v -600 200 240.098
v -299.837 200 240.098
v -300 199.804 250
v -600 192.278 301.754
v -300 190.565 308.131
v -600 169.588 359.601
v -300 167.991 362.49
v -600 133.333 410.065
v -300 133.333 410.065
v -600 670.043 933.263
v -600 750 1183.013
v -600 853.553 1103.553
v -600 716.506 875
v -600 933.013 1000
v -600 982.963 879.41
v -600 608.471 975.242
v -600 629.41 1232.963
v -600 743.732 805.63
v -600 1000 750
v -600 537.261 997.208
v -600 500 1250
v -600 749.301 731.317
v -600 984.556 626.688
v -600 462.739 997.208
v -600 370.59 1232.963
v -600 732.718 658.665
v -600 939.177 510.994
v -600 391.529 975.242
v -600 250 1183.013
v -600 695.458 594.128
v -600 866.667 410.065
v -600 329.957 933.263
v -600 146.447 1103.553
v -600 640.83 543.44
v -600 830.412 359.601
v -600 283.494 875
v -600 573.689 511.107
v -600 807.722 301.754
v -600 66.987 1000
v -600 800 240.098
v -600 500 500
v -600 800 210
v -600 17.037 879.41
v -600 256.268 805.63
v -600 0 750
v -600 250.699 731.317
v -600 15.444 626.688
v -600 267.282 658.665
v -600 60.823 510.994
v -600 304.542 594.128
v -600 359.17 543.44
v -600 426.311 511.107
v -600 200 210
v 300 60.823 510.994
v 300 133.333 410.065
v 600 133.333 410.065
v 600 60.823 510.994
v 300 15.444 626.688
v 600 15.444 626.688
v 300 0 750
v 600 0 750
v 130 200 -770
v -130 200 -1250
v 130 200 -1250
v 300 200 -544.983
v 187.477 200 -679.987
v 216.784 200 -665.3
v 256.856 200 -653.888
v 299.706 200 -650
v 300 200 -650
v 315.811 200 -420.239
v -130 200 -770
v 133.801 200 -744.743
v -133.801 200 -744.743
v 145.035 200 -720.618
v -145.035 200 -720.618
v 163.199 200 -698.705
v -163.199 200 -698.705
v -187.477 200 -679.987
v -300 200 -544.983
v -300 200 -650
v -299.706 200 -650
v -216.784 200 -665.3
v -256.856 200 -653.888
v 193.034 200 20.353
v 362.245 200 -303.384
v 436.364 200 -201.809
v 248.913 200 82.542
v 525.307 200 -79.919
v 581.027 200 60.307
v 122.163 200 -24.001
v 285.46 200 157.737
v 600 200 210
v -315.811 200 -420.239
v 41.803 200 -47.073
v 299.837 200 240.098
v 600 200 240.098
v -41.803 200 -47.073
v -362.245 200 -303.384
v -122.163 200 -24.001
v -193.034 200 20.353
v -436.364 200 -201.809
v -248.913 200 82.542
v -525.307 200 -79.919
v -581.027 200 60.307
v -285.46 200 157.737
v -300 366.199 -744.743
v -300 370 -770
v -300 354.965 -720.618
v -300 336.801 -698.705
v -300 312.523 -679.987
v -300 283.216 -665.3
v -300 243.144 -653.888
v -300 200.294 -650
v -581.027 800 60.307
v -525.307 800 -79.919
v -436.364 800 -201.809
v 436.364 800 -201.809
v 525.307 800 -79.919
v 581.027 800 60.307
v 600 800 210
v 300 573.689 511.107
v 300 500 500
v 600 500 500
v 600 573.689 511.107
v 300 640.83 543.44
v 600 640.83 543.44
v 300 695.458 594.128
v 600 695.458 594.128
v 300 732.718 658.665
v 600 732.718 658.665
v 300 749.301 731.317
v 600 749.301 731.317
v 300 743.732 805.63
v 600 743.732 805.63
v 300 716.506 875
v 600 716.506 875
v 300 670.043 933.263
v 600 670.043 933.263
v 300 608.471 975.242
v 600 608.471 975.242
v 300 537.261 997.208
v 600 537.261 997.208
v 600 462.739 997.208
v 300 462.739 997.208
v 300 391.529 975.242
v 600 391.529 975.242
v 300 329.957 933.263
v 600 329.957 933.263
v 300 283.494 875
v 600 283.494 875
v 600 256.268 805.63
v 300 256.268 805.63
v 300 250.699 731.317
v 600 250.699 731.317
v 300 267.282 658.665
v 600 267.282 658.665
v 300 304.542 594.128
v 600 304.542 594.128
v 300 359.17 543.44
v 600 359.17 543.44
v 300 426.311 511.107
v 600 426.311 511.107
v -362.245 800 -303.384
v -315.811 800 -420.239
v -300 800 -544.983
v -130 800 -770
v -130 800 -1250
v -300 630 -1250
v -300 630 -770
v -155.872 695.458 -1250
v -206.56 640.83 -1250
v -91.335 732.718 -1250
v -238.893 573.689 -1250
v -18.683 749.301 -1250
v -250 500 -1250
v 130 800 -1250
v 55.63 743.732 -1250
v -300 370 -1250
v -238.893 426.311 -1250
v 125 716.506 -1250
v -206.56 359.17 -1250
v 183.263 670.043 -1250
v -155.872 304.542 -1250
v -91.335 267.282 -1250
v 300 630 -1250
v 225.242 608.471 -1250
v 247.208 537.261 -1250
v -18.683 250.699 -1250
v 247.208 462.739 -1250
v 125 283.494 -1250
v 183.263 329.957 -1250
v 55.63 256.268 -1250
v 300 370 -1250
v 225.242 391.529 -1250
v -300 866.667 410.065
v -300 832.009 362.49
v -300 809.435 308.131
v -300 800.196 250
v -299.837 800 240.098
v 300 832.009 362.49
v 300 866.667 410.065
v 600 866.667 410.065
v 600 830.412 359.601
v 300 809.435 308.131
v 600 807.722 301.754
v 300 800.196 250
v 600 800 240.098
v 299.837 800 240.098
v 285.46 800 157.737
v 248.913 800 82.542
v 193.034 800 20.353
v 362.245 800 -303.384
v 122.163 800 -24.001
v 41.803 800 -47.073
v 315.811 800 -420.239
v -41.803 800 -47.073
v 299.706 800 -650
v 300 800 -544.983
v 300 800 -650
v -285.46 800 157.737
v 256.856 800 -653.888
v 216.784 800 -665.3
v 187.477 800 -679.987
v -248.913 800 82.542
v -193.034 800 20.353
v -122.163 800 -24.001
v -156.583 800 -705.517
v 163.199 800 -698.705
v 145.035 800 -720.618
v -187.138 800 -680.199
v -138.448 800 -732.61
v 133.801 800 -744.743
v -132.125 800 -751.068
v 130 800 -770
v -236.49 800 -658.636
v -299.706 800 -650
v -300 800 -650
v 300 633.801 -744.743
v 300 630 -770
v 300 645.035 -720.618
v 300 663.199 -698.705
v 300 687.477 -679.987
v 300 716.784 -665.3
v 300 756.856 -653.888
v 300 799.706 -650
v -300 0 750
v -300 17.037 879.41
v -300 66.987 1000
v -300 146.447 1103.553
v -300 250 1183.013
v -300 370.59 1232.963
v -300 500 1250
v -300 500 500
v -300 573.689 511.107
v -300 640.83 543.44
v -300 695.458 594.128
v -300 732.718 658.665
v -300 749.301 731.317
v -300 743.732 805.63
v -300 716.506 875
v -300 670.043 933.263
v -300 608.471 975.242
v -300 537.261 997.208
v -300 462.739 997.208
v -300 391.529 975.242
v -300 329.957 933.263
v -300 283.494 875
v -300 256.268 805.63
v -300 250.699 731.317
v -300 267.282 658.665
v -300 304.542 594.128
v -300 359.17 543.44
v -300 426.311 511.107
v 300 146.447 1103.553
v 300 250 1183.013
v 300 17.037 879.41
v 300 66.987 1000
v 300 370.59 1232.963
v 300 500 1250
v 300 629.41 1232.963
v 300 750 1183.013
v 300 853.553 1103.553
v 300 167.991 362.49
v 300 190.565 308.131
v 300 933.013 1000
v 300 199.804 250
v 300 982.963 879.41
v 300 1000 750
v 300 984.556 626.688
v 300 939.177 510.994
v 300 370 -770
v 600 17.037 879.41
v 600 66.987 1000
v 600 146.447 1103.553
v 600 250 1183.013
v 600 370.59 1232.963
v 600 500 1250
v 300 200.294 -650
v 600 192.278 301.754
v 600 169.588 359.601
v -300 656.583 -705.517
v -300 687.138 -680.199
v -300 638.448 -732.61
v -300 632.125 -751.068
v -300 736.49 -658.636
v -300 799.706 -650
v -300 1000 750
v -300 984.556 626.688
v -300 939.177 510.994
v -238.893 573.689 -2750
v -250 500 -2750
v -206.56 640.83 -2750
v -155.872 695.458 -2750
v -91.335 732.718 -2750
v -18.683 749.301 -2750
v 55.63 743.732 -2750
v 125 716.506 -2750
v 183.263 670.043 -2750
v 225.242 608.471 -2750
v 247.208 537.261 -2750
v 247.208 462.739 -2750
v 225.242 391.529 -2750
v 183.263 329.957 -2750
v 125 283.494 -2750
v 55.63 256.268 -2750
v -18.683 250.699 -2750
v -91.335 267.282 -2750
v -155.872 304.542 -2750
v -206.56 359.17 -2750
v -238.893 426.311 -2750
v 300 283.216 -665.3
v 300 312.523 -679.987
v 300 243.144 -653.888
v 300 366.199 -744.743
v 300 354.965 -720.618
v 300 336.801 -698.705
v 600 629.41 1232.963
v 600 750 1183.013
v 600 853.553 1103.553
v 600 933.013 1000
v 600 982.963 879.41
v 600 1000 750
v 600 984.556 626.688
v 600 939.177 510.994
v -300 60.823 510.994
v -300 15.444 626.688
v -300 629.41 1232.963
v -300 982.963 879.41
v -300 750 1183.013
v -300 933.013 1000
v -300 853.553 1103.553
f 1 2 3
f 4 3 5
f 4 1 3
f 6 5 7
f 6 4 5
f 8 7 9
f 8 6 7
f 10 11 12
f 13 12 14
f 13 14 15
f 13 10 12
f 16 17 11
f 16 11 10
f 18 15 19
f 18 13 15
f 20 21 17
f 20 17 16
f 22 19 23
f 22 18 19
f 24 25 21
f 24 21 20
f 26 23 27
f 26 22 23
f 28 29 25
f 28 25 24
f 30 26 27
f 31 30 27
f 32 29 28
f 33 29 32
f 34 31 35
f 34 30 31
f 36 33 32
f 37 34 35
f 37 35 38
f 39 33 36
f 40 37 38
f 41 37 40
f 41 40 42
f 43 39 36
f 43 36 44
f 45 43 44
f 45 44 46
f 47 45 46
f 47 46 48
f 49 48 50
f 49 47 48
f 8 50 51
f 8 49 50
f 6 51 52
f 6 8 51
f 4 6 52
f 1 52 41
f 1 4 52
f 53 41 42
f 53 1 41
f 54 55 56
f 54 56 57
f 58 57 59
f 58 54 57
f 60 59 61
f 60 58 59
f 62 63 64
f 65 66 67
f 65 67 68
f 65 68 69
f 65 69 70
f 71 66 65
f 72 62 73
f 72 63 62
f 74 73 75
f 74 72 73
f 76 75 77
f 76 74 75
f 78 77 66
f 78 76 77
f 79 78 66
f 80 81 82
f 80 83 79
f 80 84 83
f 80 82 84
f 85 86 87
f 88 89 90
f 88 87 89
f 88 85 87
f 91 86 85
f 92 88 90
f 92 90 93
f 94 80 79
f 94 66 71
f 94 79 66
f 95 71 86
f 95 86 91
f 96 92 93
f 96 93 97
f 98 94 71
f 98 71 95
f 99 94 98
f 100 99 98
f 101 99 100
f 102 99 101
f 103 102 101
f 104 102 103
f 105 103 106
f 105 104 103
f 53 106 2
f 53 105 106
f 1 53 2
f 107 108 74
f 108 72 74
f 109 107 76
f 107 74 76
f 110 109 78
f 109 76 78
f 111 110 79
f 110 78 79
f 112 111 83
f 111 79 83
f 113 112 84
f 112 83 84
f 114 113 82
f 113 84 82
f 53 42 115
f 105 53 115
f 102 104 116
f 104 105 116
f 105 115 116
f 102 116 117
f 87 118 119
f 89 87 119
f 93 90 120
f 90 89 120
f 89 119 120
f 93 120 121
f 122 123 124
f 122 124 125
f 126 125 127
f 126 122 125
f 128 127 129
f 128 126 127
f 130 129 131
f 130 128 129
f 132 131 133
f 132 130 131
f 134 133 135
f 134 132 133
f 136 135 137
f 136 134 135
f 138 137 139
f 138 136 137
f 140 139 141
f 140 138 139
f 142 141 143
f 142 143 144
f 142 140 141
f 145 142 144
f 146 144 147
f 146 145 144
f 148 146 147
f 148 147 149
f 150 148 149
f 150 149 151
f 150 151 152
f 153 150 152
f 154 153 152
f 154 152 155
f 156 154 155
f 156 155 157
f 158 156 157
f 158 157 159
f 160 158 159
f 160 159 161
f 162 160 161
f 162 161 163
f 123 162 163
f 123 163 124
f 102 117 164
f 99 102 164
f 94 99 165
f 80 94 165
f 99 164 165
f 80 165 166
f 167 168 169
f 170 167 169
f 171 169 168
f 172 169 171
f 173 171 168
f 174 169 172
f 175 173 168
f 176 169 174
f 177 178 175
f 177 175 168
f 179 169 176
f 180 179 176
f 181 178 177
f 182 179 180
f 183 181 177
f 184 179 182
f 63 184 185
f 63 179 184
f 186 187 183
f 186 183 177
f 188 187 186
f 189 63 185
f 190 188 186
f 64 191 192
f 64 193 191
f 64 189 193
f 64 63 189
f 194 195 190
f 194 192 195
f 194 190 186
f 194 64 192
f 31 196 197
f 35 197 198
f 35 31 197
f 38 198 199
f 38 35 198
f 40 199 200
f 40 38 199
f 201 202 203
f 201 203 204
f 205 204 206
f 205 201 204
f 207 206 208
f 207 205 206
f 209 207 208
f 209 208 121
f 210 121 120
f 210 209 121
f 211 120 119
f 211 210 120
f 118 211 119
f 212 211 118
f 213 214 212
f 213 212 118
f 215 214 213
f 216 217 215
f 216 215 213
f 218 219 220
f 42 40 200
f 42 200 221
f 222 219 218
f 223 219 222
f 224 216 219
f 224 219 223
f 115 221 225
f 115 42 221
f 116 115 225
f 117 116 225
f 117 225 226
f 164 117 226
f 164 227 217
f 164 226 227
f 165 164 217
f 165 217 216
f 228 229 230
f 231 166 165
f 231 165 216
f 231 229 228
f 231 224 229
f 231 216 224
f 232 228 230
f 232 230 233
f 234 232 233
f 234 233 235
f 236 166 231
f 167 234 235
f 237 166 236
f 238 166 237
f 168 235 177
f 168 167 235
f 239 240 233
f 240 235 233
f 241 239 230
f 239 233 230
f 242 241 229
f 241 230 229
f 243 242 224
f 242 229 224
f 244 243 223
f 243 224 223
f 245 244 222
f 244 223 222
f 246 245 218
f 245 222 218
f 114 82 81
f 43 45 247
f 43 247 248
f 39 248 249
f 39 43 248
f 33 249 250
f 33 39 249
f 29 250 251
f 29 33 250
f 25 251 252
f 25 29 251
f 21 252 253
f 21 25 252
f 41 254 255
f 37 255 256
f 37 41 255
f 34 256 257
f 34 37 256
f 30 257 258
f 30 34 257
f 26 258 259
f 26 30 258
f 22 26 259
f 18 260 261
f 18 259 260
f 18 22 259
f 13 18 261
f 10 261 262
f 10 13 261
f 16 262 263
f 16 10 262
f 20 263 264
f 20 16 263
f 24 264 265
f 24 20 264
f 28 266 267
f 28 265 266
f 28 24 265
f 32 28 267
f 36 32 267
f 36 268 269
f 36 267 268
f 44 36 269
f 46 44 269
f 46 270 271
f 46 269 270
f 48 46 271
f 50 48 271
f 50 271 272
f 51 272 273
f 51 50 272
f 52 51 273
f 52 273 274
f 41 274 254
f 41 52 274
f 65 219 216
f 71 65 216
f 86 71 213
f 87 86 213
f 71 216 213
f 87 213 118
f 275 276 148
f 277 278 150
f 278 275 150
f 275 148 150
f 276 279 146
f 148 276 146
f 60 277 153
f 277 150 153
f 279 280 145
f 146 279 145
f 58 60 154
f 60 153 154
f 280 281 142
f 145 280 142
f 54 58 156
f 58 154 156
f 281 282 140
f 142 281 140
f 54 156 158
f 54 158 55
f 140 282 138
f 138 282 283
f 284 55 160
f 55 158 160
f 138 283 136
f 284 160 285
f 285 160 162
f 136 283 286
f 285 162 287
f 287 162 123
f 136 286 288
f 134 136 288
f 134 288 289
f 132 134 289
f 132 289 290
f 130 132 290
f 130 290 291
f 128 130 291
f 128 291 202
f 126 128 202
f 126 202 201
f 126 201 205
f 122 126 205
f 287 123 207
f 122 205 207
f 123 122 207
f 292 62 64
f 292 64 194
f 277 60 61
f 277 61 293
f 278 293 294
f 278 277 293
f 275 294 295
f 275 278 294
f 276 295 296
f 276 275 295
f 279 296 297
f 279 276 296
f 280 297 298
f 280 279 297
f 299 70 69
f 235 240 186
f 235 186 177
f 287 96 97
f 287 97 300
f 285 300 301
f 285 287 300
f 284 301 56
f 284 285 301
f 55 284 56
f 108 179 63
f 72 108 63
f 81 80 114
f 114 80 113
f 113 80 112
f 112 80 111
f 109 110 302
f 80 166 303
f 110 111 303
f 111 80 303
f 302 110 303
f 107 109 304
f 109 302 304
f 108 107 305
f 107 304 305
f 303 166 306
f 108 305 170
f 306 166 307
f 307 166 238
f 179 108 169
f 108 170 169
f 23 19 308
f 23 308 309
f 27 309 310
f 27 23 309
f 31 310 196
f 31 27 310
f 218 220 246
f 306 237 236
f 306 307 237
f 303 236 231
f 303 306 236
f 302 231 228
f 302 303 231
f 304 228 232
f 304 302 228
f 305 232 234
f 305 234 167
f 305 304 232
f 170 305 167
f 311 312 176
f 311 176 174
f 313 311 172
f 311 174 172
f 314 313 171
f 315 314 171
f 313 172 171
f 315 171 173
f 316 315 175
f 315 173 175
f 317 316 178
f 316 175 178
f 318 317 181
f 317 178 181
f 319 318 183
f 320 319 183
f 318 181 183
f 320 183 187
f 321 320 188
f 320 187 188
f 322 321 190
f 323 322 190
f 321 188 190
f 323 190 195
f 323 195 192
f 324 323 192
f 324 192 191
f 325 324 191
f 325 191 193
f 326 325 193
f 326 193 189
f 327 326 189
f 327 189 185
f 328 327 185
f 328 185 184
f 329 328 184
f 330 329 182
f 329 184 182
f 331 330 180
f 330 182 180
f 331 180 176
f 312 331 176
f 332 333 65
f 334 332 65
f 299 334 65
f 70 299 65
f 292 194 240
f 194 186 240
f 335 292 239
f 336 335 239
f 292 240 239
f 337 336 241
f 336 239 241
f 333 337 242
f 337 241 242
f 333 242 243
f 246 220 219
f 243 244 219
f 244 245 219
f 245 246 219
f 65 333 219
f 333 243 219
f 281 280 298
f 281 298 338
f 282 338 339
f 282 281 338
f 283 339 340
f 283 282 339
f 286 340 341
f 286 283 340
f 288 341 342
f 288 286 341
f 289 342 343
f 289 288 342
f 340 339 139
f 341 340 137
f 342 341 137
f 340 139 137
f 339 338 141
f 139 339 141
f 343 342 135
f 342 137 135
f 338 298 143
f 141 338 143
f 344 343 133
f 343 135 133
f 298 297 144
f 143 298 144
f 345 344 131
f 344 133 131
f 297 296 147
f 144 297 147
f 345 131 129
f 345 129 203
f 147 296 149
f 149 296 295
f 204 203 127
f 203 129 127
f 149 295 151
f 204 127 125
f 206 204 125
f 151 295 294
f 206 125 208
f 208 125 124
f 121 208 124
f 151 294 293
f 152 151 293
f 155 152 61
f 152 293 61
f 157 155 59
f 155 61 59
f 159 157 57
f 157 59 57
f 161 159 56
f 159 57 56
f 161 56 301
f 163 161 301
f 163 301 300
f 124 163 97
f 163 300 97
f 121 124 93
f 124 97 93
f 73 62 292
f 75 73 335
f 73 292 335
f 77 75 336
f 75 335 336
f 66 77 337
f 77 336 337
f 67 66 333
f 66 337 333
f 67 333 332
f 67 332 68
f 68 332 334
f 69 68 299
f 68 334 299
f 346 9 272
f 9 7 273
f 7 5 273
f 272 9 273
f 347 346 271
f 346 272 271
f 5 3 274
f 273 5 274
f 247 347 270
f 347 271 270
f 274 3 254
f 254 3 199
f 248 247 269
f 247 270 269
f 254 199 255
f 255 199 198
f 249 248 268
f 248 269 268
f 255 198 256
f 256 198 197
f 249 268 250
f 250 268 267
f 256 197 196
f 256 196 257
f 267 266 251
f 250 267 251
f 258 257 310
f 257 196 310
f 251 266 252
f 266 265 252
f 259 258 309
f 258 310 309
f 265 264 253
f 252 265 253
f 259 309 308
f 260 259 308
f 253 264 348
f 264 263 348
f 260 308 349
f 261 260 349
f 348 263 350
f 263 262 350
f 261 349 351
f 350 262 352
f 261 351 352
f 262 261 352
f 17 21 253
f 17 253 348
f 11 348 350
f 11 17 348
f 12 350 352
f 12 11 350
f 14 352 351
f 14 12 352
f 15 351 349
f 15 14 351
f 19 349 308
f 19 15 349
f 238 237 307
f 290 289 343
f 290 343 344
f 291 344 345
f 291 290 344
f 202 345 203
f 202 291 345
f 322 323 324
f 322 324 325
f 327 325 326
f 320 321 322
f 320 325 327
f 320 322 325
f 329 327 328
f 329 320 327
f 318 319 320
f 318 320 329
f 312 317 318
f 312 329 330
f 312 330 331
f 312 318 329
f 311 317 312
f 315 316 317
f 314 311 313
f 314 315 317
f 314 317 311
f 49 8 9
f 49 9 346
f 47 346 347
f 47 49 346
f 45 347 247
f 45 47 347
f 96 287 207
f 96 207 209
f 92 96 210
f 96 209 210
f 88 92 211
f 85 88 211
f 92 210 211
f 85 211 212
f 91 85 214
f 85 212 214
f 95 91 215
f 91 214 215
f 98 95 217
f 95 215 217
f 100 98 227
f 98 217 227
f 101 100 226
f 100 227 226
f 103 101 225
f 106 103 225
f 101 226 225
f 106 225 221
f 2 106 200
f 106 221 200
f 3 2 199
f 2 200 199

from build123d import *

# Parameters (mm, degrees)
SKETCH1_W           = 1200
SKETCH1_H           = 2500
BOSS_EXTRUDE1_DEPTH = 1000
CUT_EXTRUDE1_DEPTH  = 1000
SKETCH3_R           = 250
CUT_EXTRUDE4_DEPTH  = 1315
CUT_EXTRUDE9_DEPTH  = 600
SKETCH4_3_R         = 250
BOSS_EXTRUDE2_DEPTH = 1500
FILLET1_R           = 120
FILLET2_R           = 120
FILLET3_R           = 120
FILLET4_R           = 120


with BuildPart() as part:
    # Sketch1 → Boss-Extrude1 (new body)
    with BuildSketch(Plane(origin=(0, 0, 0), x_dir=(1, 0, 0), z_dir=(0, 1, 0))):
        Rectangle(SKETCH1_W, SKETCH1_H)
    extrude(amount=BOSS_EXTRUDE1_DEPTH)

    # Sketch2 → Cut-Extrude1 (cut)
    with BuildSketch(Plane(origin=(0, 1000, 0), x_dir=(1, 0, 0), z_dir=(0, 1, 0))):
        with BuildLine():
            ThreePointArc((300, -250), (0, 50), (-300, -250))
            Line((-300, -250), (-300, -1250))
            Line((-300, -1250), (300, -1250))
            Line((300, -1250), (300, -250))
        make_face()
        with BuildLine():
            Line((600, 1250), (300, 1250))
            Line((300, 1250), (300, 544.983443527))
            ThreePointArc((300, 544.983443527), (335.339811358, 360.346207058), (436.363636364, 201.809151015))
            ThreePointArc((436.363636364, 201.809151015), (557.592226956, 11.564682291), (600, -210.000003168))
            Line((600, -210.000003168), (600, 1250))
        make_face()
        with BuildLine():
            Line((-300, 544.983443527), (-300, 1250))
            Line((-300, 1250), (-600, 1250))
            Line((-600, 1250), (-600, -210))
            ThreePointArc((-600, -210), (-557.592226371, 11.564683763), (-436.363636364, 201.809151015))
            ThreePointArc((-436.363636364, 201.809151015), (-335.339811358, 360.346207058), (-300, 544.983443527))
        make_face()
    extrude(amount=-CUT_EXTRUDE1_DEPTH, mode=Mode.SUBTRACT)

    # Sketch3 → Cut-Extrude4 (cut)
    with BuildSketch(Plane(origin=(600, 0, 0), x_dir=(0, 0, -1), z_dir=(1, 0, 0))):
        with BuildLine():
            ThreePointArc((-410.06536576, 866.666666667), (-331.385141558, 817.262665937), (-240.098048641, 800))
            Line((-240.098048641, 800), (1250, 800))
            Line((1250, 800), (1250, 1000))
            Line((1250, 1000), (-750, 1000))
            ThreePointArc((-750, 1000), (-567.425814165, 965.474668126), (-410.06536576, 866.666666667))
        make_face()
        with BuildLine():
            Line((-750, 0), (1250, 0))
            Line((1250, 0), (1250, 200))
            Line((1250, 200), (-240.098048641, 200))
            ThreePointArc((-240.098048641, 200), (-331.385141558, 182.737334063), (-410.06536576, 133.333333333))
            ThreePointArc((-410.06536576, 133.333333333), (-567.425814165, 34.525331874), (-750, 0))
        make_face()
        with BuildLine():
            ThreePointArc((-1250, 500), (-1103.553390593, 853.553390593), (-750, 1000))
            Line((-750, 1000), (-1250, 1000))
            Line((-1250, 1000), (-1250, 500))
        make_face()
        with BuildLine():
            ThreePointArc((-750, 0), (-1103.553390593, 146.446609407), (-1250, 500))
            Line((-1250, 500), (-1250, 0))
            Line((-1250, 0), (-750, 0))
        make_face()
        with Locations((-750, 500)):
            Circle(SKETCH3_R)
    extrude(amount=-CUT_EXTRUDE4_DEPTH, mode=Mode.SUBTRACT)

    # Sketch4 → Cut-Extrude9 (cut)
    with BuildSketch(Plane(origin=(0, 0, -1250), x_dir=(-1, 0, 0), z_dir=(0, 0, -1))):
        Polygon((300, 630), (300, 800), (130, 800), align=None)
        Polygon((300, 200), (300, 370), (130, 200), align=None)
        Polygon((-300, 200), (-130, 200), (-300, 370), align=None)
        Polygon((-300, 800), (-300, 630), (-130, 800), align=None)
    extrude(amount=-CUT_EXTRUDE9_DEPTH, mode=Mode.SUBTRACT)

    # Sketch4<3> → Boss-Extrude2 (add)
    with BuildSketch(Plane(origin=(0, 0, -1250), x_dir=(-1, 0, 0), z_dir=(0, 0, -1))):
        with Locations((0, 500)):
            Circle(SKETCH4_3_R)
    extrude(amount=BOSS_EXTRUDE2_DEPTH)

    # Fillet1
    fillet1_edges = [part.edges().sort_by_distance(p)[0] for p in [
        (-215, 715, -650),
    ]]
    fillet(fillet1_edges, radius=FILLET1_R)

    # Fillet2
    fillet2_edges = [part.edges().sort_by_distance(p)[0] for p in [
        (-215, 285, -650),
    ]]
    fillet(fillet2_edges, radius=FILLET2_R)

    # Fillet3
    fillet3_edges = [part.edges().sort_by_distance(p)[0] for p in [
        (215, 715, -650),
    ]]
    fillet(fillet3_edges, radius=FILLET3_R)

    # Fillet4
    fillet4_edges = [part.edges().sort_by_distance(p)[0] for p in [
        (215, 285, -650),
    ]]
    fillet(fillet4_edges, radius=FILLET4_R)


solid = part.part
